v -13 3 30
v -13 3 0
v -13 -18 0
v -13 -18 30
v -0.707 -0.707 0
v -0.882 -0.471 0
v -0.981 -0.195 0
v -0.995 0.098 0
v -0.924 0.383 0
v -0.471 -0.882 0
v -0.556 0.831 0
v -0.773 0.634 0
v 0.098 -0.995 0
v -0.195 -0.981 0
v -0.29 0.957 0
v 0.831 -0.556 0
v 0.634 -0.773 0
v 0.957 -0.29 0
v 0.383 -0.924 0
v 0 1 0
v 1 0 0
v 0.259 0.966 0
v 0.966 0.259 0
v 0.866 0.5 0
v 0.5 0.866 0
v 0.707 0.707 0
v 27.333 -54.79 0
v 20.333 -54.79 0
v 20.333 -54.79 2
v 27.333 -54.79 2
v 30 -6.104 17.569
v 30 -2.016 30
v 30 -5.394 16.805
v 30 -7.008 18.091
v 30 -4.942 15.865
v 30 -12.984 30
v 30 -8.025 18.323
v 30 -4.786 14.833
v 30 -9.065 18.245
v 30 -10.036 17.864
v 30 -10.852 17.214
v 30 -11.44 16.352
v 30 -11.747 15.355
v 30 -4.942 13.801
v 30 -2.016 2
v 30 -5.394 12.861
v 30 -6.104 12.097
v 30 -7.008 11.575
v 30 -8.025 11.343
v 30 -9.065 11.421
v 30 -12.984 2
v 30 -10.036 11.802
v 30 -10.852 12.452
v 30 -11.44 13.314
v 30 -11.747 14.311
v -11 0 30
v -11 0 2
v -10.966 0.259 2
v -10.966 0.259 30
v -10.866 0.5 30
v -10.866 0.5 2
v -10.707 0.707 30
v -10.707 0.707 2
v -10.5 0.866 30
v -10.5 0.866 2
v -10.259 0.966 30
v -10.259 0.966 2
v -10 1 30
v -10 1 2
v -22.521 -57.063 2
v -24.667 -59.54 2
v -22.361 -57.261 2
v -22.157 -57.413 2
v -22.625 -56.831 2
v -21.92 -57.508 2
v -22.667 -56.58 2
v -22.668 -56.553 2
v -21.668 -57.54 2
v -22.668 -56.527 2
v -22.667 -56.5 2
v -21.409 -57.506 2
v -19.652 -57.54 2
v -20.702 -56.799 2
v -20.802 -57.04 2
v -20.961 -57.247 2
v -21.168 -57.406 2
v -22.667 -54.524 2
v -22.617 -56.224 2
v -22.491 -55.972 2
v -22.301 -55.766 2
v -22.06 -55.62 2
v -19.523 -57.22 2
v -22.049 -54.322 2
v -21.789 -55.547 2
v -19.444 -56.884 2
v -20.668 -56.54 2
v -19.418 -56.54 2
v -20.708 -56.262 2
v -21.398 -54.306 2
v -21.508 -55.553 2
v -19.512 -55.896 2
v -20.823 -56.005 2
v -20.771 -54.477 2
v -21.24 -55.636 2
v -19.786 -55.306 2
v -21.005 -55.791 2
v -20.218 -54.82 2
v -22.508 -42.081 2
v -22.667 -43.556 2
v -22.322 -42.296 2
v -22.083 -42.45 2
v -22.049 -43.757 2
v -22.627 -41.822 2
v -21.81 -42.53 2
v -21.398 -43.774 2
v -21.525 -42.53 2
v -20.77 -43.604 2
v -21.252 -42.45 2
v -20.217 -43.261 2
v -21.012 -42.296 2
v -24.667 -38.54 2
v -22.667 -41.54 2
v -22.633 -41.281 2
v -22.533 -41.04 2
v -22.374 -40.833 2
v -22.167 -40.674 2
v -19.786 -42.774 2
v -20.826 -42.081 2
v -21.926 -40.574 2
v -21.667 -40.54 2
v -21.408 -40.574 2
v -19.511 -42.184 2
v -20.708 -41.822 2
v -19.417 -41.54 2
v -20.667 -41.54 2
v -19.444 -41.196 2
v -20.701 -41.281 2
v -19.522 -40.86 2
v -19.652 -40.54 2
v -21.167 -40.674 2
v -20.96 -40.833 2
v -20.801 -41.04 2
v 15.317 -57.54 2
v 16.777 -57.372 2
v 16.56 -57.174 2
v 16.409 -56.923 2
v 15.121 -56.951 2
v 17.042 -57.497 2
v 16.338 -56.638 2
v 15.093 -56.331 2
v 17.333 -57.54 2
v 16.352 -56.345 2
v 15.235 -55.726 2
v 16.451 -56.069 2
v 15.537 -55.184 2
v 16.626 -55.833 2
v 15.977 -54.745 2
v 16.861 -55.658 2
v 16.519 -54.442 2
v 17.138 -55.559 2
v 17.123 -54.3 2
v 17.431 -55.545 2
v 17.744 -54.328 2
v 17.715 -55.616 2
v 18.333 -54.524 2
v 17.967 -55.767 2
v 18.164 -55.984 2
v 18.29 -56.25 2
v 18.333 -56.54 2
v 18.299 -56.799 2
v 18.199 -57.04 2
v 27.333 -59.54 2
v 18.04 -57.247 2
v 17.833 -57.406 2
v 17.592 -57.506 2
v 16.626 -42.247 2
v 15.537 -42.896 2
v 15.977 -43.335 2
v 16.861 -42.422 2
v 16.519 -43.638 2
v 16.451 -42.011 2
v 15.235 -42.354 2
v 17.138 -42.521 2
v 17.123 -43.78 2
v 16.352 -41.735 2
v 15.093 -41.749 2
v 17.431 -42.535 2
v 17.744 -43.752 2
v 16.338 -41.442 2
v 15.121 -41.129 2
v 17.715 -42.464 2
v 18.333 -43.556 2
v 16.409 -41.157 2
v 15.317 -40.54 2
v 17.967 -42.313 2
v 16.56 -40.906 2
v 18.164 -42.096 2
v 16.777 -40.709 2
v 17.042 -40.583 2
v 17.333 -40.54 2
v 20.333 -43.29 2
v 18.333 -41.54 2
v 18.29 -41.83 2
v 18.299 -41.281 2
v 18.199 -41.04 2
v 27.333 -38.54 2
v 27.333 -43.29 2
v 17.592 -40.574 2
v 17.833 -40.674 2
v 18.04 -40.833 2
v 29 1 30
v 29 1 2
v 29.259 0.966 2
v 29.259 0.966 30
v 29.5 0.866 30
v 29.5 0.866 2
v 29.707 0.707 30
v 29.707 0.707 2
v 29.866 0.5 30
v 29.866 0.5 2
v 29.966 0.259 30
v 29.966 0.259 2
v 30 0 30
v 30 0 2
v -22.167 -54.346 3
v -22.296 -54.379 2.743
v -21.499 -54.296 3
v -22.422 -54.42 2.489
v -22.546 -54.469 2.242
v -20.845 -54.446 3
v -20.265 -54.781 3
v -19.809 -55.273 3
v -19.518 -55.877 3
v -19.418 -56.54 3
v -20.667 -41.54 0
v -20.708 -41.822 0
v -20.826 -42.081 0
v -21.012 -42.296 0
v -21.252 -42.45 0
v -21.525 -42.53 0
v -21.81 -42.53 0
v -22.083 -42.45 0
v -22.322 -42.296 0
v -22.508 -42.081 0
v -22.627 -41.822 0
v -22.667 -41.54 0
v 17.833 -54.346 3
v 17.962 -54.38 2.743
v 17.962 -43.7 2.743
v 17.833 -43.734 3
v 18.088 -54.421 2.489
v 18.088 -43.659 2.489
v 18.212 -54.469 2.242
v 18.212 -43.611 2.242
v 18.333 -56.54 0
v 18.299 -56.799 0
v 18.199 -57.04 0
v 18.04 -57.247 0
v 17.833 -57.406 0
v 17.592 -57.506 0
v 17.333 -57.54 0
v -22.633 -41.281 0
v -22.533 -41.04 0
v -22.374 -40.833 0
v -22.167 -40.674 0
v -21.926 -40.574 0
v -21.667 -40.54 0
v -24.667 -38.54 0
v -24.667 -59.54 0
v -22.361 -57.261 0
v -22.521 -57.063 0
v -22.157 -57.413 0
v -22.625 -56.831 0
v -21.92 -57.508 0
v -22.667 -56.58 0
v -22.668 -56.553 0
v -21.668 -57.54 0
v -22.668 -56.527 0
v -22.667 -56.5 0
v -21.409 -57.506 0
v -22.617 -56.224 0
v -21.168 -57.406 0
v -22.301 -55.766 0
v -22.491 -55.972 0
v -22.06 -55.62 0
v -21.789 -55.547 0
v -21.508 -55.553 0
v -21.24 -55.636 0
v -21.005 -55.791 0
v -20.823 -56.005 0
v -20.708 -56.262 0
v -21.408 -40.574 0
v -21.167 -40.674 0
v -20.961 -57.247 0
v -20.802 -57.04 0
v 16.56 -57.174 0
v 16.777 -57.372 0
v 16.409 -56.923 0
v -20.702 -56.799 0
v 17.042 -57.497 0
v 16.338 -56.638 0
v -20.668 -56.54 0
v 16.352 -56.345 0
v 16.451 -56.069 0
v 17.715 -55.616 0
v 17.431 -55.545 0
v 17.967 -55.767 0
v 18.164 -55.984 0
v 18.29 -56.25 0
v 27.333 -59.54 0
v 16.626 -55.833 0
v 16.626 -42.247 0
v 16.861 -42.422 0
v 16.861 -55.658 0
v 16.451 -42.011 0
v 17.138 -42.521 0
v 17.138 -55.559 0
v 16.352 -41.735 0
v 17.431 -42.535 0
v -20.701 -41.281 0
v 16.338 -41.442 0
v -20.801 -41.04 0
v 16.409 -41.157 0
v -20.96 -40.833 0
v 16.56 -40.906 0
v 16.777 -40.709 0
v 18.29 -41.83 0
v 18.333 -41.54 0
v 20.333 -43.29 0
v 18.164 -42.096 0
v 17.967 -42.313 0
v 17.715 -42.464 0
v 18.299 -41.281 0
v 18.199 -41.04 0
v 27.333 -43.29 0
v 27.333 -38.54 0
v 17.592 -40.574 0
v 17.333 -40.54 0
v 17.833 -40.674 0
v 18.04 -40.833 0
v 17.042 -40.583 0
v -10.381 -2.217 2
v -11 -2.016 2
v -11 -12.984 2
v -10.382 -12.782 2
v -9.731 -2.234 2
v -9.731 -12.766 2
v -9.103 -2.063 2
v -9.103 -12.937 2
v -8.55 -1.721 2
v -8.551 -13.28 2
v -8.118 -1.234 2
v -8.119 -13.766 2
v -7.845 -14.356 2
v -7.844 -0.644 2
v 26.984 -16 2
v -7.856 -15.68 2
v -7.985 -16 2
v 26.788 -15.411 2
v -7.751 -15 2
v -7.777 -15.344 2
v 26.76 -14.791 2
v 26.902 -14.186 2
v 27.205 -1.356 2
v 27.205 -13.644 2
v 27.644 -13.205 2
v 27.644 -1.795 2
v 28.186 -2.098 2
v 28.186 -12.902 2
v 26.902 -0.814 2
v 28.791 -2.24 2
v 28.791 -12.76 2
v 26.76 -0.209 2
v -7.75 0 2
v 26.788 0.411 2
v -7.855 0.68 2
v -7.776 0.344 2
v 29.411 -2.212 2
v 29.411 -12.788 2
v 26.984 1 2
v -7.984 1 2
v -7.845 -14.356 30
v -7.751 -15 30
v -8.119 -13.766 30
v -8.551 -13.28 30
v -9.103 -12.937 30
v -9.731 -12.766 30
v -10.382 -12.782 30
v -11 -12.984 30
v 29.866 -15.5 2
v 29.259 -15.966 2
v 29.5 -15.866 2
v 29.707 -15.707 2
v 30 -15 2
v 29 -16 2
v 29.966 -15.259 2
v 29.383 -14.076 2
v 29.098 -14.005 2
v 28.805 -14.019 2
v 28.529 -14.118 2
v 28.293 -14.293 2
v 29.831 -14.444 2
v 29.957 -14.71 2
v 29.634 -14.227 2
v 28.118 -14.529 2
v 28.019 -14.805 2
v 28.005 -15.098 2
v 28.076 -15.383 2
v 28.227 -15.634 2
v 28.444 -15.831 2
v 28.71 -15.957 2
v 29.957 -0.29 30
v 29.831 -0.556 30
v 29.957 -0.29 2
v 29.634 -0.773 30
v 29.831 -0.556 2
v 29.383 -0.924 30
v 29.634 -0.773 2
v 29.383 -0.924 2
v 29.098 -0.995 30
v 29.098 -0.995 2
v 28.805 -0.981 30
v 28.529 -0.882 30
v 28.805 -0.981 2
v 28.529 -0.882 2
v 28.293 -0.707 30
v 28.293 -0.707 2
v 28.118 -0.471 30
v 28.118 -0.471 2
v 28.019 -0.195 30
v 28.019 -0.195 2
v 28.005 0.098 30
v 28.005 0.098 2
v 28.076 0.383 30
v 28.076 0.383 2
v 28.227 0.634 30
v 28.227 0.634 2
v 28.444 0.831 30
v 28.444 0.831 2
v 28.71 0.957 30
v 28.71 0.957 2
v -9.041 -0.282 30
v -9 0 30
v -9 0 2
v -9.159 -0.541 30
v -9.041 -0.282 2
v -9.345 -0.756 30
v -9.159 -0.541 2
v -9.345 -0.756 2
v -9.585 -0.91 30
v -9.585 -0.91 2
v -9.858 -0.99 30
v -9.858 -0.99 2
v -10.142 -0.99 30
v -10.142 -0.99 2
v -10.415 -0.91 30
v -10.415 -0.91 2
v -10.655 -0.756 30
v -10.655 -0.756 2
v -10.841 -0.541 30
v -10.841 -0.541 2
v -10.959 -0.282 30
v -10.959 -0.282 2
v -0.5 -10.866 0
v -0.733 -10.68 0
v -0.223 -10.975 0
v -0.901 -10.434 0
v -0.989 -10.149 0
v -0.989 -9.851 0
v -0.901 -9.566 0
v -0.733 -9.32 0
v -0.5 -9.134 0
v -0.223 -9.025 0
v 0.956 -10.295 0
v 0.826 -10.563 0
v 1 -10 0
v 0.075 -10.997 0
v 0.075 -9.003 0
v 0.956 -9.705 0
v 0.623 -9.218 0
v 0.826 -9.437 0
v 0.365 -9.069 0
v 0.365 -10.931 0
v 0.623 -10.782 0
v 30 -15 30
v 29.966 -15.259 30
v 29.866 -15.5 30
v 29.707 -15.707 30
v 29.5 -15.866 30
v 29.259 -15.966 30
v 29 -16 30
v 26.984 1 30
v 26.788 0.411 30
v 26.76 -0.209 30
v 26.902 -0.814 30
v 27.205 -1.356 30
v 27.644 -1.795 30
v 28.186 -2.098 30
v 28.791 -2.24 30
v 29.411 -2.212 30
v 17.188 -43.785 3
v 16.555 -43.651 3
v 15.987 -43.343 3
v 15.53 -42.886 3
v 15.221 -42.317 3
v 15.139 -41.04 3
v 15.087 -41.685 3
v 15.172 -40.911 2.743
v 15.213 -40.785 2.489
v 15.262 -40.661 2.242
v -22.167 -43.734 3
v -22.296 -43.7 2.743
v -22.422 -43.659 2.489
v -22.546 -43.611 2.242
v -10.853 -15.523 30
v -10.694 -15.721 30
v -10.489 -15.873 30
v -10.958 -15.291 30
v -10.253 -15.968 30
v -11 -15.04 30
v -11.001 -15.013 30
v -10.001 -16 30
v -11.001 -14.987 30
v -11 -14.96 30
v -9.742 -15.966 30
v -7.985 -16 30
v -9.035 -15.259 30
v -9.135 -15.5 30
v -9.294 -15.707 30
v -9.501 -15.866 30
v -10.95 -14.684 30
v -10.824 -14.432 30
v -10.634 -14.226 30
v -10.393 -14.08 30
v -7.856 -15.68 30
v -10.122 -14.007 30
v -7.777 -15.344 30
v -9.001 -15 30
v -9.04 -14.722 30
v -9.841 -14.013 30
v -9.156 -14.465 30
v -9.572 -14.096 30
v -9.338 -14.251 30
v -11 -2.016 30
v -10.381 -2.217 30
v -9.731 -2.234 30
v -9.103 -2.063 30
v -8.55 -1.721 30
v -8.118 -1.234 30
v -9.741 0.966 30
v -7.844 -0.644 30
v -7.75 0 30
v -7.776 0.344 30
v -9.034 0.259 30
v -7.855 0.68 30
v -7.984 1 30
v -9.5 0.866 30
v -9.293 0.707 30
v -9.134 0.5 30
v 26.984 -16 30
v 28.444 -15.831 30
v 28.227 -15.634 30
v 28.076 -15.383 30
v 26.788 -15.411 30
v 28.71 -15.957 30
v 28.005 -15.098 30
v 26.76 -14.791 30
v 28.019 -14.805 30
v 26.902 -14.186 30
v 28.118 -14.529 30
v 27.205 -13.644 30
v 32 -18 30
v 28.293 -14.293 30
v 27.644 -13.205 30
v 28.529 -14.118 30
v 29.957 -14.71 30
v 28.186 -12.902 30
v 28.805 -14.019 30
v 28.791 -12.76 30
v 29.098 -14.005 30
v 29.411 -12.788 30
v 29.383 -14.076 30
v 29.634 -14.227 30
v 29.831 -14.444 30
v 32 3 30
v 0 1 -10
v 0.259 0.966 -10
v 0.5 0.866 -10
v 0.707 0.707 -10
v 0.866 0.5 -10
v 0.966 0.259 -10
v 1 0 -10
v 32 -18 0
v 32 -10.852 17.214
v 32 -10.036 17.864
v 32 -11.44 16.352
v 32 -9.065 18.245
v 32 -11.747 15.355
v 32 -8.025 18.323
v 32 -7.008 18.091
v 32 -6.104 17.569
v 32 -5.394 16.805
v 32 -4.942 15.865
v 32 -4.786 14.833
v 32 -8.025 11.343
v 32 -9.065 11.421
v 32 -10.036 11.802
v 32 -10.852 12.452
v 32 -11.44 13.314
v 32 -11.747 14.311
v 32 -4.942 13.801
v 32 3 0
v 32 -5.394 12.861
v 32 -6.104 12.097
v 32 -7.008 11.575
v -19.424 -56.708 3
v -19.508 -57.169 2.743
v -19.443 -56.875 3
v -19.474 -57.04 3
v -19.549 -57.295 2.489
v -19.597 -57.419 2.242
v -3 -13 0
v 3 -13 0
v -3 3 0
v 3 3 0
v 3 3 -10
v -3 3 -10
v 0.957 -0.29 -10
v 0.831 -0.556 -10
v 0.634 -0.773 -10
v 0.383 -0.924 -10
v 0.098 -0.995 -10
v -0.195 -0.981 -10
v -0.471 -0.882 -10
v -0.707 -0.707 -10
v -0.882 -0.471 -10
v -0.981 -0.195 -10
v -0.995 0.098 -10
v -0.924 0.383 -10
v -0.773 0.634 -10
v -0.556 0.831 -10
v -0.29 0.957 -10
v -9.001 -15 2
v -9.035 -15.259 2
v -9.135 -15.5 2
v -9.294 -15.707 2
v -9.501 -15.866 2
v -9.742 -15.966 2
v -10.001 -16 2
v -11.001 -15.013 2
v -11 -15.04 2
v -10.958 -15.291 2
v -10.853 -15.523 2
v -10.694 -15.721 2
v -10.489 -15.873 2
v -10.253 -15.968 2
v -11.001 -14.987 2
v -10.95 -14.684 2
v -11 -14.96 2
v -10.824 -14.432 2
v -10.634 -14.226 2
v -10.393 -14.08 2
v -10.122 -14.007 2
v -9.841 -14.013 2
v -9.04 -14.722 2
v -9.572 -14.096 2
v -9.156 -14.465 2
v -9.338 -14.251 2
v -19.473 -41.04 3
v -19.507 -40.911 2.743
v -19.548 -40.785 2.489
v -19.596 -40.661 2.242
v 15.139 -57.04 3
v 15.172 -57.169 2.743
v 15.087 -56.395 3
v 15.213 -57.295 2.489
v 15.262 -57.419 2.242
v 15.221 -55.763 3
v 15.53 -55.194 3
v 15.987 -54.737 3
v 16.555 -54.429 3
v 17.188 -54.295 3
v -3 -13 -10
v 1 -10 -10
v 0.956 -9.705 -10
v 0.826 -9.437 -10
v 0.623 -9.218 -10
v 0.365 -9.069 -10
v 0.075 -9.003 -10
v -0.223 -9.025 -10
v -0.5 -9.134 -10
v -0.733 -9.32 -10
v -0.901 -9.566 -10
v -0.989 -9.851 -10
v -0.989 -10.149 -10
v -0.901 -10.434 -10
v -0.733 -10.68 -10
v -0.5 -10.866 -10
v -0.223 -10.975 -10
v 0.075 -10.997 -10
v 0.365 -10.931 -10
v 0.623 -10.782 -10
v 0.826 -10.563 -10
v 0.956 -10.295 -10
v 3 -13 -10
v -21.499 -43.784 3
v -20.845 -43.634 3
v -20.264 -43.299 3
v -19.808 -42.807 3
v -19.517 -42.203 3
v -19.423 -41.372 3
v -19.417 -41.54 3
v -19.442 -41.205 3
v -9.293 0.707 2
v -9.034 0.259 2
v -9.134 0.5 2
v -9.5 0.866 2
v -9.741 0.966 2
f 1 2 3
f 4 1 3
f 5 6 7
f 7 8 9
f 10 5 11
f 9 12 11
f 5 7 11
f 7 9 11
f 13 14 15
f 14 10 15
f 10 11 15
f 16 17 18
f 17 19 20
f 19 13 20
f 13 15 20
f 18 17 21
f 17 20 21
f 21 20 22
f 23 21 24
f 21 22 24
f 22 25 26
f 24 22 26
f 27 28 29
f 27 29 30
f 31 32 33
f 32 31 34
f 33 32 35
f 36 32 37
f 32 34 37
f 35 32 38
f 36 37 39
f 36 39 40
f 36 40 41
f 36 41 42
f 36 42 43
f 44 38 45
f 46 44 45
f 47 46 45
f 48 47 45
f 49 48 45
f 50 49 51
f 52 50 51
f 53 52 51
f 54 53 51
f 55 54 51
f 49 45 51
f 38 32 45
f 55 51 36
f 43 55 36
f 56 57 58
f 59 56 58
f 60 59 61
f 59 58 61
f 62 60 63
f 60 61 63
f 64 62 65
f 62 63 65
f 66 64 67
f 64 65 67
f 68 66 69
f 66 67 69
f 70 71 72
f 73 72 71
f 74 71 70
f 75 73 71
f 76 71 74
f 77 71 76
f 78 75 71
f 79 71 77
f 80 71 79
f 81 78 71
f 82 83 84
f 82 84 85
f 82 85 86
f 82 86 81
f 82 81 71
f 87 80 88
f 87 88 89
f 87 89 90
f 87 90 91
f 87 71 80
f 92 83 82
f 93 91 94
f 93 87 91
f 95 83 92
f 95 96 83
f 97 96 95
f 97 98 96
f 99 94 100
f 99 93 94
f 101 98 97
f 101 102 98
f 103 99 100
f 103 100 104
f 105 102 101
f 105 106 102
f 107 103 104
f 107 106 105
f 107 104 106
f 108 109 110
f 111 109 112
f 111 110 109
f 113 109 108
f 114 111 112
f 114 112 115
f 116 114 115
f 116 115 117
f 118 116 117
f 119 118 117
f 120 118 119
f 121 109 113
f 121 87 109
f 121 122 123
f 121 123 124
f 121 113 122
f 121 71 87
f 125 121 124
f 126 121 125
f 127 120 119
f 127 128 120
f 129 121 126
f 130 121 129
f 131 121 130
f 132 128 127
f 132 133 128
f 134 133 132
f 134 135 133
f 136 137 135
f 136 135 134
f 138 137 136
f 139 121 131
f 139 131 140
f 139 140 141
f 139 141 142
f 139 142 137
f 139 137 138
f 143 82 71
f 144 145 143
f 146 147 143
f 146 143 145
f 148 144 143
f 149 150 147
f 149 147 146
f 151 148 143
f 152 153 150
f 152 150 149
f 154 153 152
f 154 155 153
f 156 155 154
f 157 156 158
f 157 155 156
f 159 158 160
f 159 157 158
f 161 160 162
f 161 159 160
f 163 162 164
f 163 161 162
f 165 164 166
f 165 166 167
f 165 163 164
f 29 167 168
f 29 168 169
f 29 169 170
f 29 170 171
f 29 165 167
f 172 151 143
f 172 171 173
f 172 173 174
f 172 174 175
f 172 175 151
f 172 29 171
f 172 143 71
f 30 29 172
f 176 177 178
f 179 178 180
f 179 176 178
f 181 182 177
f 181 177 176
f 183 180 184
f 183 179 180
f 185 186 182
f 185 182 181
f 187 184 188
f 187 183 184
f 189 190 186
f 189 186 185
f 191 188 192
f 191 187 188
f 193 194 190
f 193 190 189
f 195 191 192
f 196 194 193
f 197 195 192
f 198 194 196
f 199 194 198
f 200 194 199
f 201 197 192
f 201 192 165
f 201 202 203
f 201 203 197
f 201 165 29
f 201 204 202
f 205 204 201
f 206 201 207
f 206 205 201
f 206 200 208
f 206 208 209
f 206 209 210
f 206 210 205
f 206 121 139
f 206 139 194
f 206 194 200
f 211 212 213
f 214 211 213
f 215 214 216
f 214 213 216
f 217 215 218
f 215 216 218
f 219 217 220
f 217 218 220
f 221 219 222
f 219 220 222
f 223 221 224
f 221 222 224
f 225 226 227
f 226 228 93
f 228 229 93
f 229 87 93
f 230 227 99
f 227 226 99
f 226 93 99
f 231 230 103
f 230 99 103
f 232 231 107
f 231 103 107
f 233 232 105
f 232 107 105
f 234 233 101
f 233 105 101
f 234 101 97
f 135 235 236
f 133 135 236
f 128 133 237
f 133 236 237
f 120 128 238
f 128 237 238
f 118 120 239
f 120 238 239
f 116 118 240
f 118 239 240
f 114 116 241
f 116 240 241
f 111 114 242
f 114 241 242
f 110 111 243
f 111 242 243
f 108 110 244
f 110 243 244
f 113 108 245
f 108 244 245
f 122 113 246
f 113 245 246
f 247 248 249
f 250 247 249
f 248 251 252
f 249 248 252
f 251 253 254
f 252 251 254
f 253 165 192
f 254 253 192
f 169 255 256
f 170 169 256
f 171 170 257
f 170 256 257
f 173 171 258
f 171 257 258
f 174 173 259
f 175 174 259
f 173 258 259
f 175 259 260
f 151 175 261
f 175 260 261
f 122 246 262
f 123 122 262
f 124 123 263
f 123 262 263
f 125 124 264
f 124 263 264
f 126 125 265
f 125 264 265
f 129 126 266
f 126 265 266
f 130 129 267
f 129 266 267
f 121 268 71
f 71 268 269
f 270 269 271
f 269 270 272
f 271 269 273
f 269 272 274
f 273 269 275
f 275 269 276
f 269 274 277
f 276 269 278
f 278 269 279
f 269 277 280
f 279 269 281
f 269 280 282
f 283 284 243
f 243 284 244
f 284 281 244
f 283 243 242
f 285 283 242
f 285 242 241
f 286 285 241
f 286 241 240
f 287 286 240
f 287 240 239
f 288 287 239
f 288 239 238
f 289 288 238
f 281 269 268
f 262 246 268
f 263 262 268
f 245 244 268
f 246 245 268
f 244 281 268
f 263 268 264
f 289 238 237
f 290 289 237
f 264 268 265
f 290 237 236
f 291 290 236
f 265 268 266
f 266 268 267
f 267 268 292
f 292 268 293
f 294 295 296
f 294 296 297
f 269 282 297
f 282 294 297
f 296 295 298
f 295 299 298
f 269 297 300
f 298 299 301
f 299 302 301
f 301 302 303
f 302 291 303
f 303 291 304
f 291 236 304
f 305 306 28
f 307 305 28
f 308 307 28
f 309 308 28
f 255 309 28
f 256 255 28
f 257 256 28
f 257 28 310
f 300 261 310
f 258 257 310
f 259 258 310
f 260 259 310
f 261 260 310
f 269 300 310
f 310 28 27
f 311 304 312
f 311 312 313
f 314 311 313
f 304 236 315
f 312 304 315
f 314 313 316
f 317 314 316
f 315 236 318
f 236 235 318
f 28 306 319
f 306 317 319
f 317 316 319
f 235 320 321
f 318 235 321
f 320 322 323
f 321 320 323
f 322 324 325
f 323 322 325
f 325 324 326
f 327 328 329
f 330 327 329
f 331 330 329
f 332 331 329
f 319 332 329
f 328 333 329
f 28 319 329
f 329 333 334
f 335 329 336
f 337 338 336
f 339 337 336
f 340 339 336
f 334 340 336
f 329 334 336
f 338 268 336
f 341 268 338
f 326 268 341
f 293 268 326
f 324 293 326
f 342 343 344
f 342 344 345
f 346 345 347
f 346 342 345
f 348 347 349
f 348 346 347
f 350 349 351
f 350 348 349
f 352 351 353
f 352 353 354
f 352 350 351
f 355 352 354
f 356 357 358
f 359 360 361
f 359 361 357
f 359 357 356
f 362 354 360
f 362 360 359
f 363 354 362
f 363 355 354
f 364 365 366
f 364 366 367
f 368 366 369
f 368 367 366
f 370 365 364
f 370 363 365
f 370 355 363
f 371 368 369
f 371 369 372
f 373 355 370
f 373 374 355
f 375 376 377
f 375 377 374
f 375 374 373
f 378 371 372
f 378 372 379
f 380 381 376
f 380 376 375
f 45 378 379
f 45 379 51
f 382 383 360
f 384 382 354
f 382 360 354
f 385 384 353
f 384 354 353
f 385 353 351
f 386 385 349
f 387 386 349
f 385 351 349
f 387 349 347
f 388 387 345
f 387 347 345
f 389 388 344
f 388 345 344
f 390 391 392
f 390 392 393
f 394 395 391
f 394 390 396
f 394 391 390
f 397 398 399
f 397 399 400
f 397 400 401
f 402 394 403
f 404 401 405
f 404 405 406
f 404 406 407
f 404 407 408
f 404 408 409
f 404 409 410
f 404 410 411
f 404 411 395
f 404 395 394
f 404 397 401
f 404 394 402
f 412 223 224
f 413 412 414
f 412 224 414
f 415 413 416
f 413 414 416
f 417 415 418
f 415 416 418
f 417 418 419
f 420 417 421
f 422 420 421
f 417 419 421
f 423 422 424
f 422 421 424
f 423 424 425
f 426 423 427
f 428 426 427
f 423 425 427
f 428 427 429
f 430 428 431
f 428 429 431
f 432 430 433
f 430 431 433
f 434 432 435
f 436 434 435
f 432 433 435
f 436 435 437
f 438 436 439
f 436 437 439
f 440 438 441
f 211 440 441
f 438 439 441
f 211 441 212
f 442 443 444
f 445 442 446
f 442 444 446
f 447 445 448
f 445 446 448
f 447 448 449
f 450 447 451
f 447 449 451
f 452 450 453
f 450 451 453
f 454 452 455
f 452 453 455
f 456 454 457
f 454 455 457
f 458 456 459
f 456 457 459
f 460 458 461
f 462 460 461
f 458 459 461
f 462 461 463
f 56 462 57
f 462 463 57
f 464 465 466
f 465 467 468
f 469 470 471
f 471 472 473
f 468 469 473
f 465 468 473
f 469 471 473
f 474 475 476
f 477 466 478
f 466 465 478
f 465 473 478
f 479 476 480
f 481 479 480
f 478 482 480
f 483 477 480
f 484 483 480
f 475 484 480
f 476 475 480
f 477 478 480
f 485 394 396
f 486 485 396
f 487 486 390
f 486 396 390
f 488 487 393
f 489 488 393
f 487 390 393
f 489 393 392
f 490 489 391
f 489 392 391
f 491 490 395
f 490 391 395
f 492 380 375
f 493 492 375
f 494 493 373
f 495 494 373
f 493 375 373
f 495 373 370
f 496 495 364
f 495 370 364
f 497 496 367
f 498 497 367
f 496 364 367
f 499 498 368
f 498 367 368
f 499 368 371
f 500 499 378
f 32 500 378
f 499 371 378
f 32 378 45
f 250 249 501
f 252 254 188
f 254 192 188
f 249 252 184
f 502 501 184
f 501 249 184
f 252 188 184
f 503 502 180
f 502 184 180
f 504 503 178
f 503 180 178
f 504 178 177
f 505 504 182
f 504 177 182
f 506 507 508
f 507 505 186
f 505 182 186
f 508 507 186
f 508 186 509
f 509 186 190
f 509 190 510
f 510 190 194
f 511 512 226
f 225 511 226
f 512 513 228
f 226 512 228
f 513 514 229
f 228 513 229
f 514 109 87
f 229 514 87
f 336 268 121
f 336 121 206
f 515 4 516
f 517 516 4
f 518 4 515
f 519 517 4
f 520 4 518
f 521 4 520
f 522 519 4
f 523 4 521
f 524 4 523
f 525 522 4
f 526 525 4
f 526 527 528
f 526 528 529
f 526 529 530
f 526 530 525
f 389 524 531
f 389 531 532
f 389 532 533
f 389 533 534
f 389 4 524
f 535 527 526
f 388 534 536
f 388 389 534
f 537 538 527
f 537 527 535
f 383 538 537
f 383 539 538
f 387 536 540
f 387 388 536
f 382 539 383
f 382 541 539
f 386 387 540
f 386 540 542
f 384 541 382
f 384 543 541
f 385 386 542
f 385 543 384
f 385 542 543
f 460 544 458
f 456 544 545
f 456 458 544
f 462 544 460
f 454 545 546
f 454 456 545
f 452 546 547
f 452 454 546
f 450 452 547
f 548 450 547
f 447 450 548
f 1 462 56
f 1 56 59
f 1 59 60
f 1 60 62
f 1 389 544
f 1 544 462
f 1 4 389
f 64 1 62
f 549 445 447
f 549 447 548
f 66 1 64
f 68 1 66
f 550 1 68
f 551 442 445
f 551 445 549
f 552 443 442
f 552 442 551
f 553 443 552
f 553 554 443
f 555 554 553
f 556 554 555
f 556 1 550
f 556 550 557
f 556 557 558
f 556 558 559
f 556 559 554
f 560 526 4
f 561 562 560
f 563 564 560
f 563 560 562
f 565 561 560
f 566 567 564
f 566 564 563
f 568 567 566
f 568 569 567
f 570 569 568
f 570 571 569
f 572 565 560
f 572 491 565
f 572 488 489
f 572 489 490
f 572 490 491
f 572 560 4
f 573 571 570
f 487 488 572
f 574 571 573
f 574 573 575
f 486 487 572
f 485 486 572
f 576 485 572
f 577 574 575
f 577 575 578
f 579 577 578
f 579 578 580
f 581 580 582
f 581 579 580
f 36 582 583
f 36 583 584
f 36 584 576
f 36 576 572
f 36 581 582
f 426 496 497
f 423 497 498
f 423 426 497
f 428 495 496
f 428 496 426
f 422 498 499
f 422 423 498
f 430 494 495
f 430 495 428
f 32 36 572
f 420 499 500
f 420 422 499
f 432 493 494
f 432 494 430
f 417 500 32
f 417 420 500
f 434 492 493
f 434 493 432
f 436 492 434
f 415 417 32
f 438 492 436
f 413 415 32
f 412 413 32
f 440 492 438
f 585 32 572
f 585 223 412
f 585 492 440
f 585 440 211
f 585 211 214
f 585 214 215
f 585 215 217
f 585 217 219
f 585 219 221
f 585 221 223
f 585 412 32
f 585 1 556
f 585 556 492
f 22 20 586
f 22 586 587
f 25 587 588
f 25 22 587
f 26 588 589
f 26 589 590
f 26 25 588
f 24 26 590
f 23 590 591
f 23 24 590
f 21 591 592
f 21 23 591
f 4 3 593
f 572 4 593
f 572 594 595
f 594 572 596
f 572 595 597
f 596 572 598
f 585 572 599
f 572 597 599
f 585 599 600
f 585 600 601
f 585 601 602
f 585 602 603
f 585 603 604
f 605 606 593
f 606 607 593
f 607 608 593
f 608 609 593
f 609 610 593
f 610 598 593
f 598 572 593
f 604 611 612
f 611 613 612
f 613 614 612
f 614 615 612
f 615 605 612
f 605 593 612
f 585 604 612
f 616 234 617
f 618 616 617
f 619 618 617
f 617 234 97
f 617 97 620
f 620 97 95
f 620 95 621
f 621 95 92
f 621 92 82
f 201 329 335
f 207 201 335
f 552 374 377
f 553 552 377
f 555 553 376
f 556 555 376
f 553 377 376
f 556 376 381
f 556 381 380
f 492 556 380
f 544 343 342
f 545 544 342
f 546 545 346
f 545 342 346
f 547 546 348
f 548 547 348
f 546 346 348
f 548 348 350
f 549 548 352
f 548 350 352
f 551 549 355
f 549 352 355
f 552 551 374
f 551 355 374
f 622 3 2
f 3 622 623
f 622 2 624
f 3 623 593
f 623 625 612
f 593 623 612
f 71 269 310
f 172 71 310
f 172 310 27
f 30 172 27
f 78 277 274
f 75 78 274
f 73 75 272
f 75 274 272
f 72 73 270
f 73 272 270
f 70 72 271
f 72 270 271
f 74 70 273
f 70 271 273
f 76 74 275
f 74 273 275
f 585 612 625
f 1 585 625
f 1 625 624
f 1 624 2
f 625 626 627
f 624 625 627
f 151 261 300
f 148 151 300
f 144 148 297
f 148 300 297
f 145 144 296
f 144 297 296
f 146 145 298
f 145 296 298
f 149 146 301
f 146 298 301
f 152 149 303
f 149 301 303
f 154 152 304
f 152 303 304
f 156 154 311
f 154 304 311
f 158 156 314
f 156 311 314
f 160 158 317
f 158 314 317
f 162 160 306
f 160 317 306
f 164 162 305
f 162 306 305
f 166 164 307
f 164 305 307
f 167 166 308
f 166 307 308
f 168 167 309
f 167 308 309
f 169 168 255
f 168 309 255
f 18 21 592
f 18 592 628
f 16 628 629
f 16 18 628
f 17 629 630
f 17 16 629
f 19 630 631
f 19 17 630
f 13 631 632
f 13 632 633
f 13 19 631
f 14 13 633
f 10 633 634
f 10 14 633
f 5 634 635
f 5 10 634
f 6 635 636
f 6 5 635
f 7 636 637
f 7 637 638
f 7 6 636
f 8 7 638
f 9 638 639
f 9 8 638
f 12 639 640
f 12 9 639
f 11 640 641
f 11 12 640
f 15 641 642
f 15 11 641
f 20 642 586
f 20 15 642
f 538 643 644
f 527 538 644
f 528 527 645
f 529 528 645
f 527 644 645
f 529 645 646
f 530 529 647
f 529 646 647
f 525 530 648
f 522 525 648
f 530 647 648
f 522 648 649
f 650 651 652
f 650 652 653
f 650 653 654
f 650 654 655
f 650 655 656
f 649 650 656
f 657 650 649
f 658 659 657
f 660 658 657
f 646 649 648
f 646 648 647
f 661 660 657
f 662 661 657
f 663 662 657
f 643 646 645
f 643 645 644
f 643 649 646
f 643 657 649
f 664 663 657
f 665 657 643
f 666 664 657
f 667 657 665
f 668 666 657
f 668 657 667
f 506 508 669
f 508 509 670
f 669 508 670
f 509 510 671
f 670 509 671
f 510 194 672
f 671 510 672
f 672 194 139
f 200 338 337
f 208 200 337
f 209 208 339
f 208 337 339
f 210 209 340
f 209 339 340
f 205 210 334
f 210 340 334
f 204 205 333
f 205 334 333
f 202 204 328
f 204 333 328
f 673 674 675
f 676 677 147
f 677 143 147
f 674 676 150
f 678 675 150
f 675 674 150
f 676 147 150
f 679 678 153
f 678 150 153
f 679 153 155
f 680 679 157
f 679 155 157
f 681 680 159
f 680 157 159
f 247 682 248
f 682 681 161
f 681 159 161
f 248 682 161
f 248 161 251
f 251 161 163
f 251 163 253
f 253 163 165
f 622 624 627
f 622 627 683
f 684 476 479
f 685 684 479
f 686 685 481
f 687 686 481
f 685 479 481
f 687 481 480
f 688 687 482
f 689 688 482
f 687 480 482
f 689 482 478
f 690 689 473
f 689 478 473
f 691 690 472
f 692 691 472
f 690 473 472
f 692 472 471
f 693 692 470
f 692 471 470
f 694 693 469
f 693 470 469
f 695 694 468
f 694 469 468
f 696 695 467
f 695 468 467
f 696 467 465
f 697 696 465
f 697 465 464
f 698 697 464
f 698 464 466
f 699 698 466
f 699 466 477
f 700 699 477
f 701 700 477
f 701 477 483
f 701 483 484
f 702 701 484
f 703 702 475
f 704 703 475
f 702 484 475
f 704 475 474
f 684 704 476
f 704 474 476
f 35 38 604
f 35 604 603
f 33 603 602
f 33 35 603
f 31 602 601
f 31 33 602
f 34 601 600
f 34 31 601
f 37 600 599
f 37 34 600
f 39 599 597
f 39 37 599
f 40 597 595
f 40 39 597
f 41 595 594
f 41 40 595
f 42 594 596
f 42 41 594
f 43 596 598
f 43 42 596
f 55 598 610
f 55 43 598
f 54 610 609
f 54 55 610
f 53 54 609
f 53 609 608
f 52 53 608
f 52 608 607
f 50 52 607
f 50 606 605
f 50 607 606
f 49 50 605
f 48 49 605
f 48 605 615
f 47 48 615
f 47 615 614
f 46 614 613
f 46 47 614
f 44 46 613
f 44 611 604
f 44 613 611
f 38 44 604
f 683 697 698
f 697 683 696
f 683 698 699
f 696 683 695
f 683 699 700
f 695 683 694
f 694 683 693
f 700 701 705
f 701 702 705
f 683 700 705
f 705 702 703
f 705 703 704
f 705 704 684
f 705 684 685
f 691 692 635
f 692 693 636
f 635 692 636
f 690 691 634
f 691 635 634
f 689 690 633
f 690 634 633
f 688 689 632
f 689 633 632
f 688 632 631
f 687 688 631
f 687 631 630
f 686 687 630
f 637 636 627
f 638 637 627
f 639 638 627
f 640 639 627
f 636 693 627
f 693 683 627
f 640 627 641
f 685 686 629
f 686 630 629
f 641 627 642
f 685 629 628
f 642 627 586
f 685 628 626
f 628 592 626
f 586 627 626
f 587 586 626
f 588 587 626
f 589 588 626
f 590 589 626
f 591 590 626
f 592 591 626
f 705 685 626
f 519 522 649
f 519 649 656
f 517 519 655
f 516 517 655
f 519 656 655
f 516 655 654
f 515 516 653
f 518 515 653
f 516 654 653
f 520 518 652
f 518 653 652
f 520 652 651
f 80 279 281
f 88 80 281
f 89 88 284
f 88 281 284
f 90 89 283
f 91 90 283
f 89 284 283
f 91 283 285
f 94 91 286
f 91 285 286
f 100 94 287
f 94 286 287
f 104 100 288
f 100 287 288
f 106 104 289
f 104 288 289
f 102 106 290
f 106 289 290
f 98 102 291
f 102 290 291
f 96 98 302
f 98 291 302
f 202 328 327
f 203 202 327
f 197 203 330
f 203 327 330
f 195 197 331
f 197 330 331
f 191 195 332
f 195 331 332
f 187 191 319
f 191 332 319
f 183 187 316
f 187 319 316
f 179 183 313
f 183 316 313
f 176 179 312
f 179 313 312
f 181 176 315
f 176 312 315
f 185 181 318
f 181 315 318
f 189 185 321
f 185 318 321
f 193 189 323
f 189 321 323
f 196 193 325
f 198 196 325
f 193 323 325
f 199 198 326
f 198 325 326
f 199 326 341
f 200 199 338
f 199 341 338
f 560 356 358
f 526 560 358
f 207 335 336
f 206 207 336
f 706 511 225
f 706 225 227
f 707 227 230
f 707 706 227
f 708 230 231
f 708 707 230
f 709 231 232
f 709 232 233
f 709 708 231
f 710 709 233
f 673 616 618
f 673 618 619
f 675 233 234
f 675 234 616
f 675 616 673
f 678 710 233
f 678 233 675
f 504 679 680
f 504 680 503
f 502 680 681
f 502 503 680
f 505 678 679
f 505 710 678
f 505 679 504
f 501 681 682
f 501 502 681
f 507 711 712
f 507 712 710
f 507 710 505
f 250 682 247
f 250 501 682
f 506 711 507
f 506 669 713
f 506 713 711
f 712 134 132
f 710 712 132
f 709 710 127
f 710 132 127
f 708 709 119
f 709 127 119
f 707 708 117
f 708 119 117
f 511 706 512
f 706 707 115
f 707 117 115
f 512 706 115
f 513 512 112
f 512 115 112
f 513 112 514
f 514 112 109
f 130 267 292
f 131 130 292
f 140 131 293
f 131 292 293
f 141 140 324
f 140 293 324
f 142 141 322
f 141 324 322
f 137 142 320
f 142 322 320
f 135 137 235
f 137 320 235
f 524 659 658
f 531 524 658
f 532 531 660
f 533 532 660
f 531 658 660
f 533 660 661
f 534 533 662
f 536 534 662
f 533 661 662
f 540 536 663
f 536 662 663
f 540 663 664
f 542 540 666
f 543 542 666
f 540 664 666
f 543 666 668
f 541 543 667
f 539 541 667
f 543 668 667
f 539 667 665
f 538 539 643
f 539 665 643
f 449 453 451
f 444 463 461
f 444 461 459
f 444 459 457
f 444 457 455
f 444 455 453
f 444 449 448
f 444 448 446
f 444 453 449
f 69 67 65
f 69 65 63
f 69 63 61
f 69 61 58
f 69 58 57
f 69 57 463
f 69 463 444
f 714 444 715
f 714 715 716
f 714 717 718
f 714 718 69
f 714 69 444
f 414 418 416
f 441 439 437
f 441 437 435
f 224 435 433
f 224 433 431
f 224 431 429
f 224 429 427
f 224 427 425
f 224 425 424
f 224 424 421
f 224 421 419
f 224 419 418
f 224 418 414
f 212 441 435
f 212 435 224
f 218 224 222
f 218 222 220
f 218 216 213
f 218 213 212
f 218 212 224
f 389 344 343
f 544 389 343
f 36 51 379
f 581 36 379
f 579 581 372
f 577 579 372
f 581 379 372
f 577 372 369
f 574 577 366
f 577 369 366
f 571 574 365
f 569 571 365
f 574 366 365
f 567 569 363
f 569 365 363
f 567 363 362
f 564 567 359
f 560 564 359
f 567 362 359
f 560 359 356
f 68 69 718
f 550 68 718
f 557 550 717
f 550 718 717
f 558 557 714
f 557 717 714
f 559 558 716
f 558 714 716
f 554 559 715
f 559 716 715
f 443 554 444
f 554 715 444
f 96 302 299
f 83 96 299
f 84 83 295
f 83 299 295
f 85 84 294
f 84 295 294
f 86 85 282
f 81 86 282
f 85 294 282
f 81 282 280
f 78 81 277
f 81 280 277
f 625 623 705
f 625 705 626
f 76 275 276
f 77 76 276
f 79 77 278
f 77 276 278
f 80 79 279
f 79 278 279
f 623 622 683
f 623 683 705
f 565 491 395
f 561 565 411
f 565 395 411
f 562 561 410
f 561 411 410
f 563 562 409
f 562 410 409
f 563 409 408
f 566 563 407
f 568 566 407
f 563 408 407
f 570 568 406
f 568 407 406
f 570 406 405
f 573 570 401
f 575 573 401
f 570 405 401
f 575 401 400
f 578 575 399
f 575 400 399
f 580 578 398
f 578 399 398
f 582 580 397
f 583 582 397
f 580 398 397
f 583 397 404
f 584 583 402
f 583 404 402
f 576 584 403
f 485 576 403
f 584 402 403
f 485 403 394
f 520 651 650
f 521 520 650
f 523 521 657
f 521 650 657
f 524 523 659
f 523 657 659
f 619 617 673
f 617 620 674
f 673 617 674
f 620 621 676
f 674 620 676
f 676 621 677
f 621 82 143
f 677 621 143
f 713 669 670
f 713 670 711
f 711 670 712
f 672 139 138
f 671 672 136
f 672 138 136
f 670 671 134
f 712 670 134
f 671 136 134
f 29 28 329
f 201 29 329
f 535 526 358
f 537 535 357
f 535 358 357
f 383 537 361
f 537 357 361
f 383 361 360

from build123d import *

# Parameters (mm, degrees)
F1_DEPTH = 30
F0_R     = 1
F2_DEPTH = 2
F3_DEPTH = 10
F4_DEPTH = 2
F5_DEPTH = 3
F6_SIZE2 = 0.99999
F6_SIZE  = 0.49999
F7_R     = 3.5
F8_DEPTH = 40
F0_W     = 7
F0_H     = 4.75
F9_DEPTH = 2


# Not quite as in the source:
# - a fillet or chamfer is up to 0.001 mm smaller than in the source, because OpenCascade refuses the exact size


with BuildPart() as f1:
    # F0 (on Top) → F1 (new body)
    with BuildSketch(Plane.XY):
        Polygon((-3, 1), (-1.2e-09, 1), (3, 1), (3, 3), (-3, 3), align=None)
        with BuildLine():
            Line((-7.9844355629, 1), (-3, 1))
            Line((-3, 1), (-3, 3))
            Line((-3, 3), (-13, 3))
            Line((-13, 3), (-13, -18))
            Line((-13, -18), (32, -18))
            Line((32, -18), (32, 3))
            Line((32, 3), (3, 3))
            Line((3, 3), (3, 1))
            Line((3, 1), (26.9844355629, 1))
            ThreePointArc((26.9844355629, 1), (29.5135562367, 2.1906072199), (31.25, 0))
            ThreePointArc((31.25, 0), (30.9121323176, -1.1858541226), (30, -2.0155644371))
            Line((30, -2.0155644371), (30, -12.9844355629))
            ThreePointArc((30, -12.9844355629), (30.9121323176, -13.8141458774), (31.25, -15))
            ThreePointArc((31.25, -15), (29.5135562367, -17.1906072199), (26.9844355629, -16))
            Line((26.9844355629, -16), (-7.9852204443, -16))
            ThreePointArc((-7.9852204443, -16), (-11.592084853, -16.5906804835), (-11, -12.9840463431))
            Line((-11, -12.9840463431), (-11, -2.0155644371))
            ThreePointArc((-11, -2.0155644371), (-11.5909902577, 1.5909902577), (-7.9844355629, 1))
        make_face()
        with BuildLine():
            ThreePointArc((-7.75, 0), (-7.8093927801, 0.5135562367), (-7.9844355629, 1))
            Line((-7.9844355629, 1), (-10, 1))
            ThreePointArc((-10, 1), (-9.2928932188, 0.7071067812), (-9, 0))
            ThreePointArc((-9, 0), (-10, -1), (-11, 0))
            Line((-11, 0), (-11, -2.0155644371))
            ThreePointArc((-11, -2.0155644371), (-8.8141458774, -1.9121323176), (-7.75, 0))
        make_face()
        with BuildLine():
            Line((-10, 1), (-7.9844355629, 1))
            ThreePointArc((-7.9844355629, 1), (-11.5909902577, 1.5909902577), (-11, -2.0155644371))
            Line((-11, -2.0155644371), (-11, 0))
            Line((-11, 0), (-11, 1))
            Line((-11, 1), (-10, 1))
        make_face()
        with BuildLine():
            ThreePointArc((31.25, 0), (29.5135562367, 2.1906072199), (26.9844355629, 1))
            Line((26.9844355629, 1), (29, 1))
            Line((29, 1), (30, 1))
            Line((30, 1), (30, 0))
            Line((30, 0), (30, -2.0155644371))
            ThreePointArc((30, -2.0155644371), (30.9121323176, -1.1858541226), (31.25, 0))
        make_face()
        with BuildLine():
            Line((29, 1), (26.9844355629, 1))
            ThreePointArc((26.9844355629, 1), (27.4090097423, -1.5909902577), (30, -2.0155644371))
            Line((30, -2.0155644371), (30, 0))
            ThreePointArc((30, 0), (28.2928932188, -0.7071067812), (29, 1))
        make_face()
        with BuildLine():
            Line((30, 1), (29, 1))
            ThreePointArc((29, 1), (29.7071067812, 0.7071067812), (30, 0))
            Line((30, 0), (30, 1))
        make_face()
        with BuildLine():
            ThreePointArc((-11, 0), (-10.7071067812, 0.7071067812), (-10, 1))
            Line((-10, 1), (-11, 1))
            Line((-11, 1), (-11, 0))
        make_face()
        with BuildLine():
            ThreePointArc((-10.0007848814, -16), (-10.6937450327, -15.7209758864), (-11, -15.0396124575))
            Line((-11, -15.0396124575), (-11, -16))
            Line((-11, -16), (-10.0007848814, -16))
        make_face()
        with BuildLine():
            Line((-11, -14.9603875425), (-11, -12.9840463431))
            ThreePointArc((-11, -12.9840463431), (-11.592084853, -16.5906804835), (-7.9852204443, -16))
            Line((-7.9852204443, -16), (-10.0007848814, -16))
            Line((-10.0007848814, -16), (-11, -16))
            Line((-11, -16), (-11, -15.0396124575))
            ThreePointArc((-11, -15.0396124575), (-11.0007848814, -15), (-11, -14.9603875425))
        make_face()
        with BuildLine():
            ThreePointArc((-7.7507848814, -15), (-8.8145585153, -13.0880985882), (-11, -12.9840463431))
            Line((-11, -12.9840463431), (-11, -14.9603875425))
            ThreePointArc((-11, -14.9603875425), (-9.9809747651, -14.0001962396), (-9.0007848814, -15))
            ThreePointArc((-9.0007848814, -15), (-9.2936781002, -15.7071067812), (-10.0007848814, -16))
            Line((-10.0007848814, -16), (-7.9852204443, -16))
            ThreePointArc((-7.9852204443, -16), (-7.8101776616, -15.5135562367), (-7.7507848814, -15))
        make_face()
        with BuildLine():
            Line((30, -16), (30, -15))
            ThreePointArc((30, -15), (29.7071067812, -15.7071067812), (29, -16))
            Line((29, -16), (30, -16))
        make_face()
        with BuildLine():
            Line((30, -15), (30, -12.9844355629))
            ThreePointArc((30, -12.9844355629), (27.4090097423, -13.4090097423), (26.9844355629, -16))
            Line((26.9844355629, -16), (29, -16))
            ThreePointArc((29, -16), (28.2928932188, -14.2928932188), (30, -15))
        make_face()
        with BuildLine():
            ThreePointArc((31.25, -15), (30.9121323176, -13.8141458774), (30, -12.9844355629))
            Line((30, -12.9844355629), (30, -15))
            Line((30, -15), (30, -16))
            Line((30, -16), (29, -16))
            Line((29, -16), (26.9844355629, -16))
            ThreePointArc((26.9844355629, -16), (29.5135562367, -17.1906072199), (31.25, -15))
        make_face()
    extrude(amount=F1_DEPTH)

    # F0 (on Top) → F2 (join)
    with BuildSketch(Plane.XY):
        with BuildLine():
            Line((-3, -13), (-3, 1))
            Line((-3, 1), (-7.9844355629, 1))
            ThreePointArc((-7.9844355629, 1), (-7.8093927801, 0.5135562367), (-7.75, 0))
            ThreePointArc((-7.75, 0), (-8.8141458774, -1.9121323176), (-11, -2.0155644371))
            Line((-11, -2.0155644371), (-11, -12.9840463431))
            ThreePointArc((-11, -12.9840463431), (-8.8145585153, -13.0880985882), (-7.7507848814, -15))
            ThreePointArc((-7.7507848814, -15), (-7.8101776616, -15.5135562367), (-7.9852204443, -16))
            Line((-7.9852204443, -16), (26.9844355629, -16))
            ThreePointArc((26.9844355629, -16), (27.4090097423, -13.4090097423), (30, -12.9844355629))
            Line((30, -12.9844355629), (30, -2.0155644371))
            ThreePointArc((30, -2.0155644371), (27.4090097423, -1.5909902577), (26.9844355629, 1))
            Line((26.9844355629, 1), (3, 1))
            Line((3, 1), (3, -13))
            Line((3, -13), (-3, -13))
        make_face()
        Polygon((3, 1), (-1.2e-09, 1), (-3, 1), (-3, -13), (3, -13), align=None)
        with Locations((0, -10)):
            Circle(F0_R, mode=Mode.SUBTRACT)
        with BuildLine():
            ThreePointArc((-1.2e-09, 1), (0.7071067808, 0.7071067816), (1, 0))
            ThreePointArc((1, 0), (-0.7071067808, -0.7071067816), (-1.2e-09, 1))
        make_face(mode=Mode.SUBTRACT)
        with BuildLine():
            ThreePointArc((-1.2e-09, 1), (-0.7071067808, -0.7071067816), (1, 0))
            ThreePointArc((1, 0), (0.7071067808, 0.7071067816), (-1.2e-09, 1))
        make_face()
        with BuildLine():
            ThreePointArc((-9, 0), (-9.2928932188, 0.7071067812), (-10, 1))
            ThreePointArc((-10, 1), (-10.7071067812, 0.7071067812), (-11, 0))
            ThreePointArc((-11, 0), (-10, -1), (-9, 0))
        make_face()
        with BuildLine():
            ThreePointArc((30, 0), (29.7071067812, 0.7071067812), (29, 1))
            ThreePointArc((29, 1), (28.2928932188, -0.7071067812), (30, 0))
        make_face()
        with BuildLine():
            ThreePointArc((29, -16), (29.7071067812, -15.7071067812), (30, -15))
            ThreePointArc((30, -15), (28.2928932188, -14.2928932188), (29, -16))
        make_face()
        with Locations((0, -10)):
            Circle(F0_R)
        with BuildLine():
            ThreePointArc((-9.0007848814, -15), (-9.9809747651, -14.0001962396), (-11, -14.9603875425))
            Line((-11, -14.9603875425), (-11, -15.0396124575))
            ThreePointArc((-11, -15.0396124575), (-10.6937450327, -15.7209758864), (-10.0007848814, -16))
            ThreePointArc((-10.0007848814, -16), (-9.2936781002, -15.7071067812), (-9.0007848814, -15))
        make_face()
        with BuildLine():
            Line((-11, -15.0396124575), (-11, -14.9603875425))
            ThreePointArc((-11, -14.9603875425), (-11.0007848814, -15), (-11, -15.0396124575))
        make_face()
    extrude(amount=F2_DEPTH)

    # F0 (on Top) → F3 (join)
    with BuildSketch(Plane.XY):
        Polygon((3, 1), (-1.2e-09, 1), (-3, 1), (-3, -13), (3, -13), align=None)
        with Locations((0, -10)):
            Circle(F0_R, mode=Mode.SUBTRACT)
        with BuildLine():
            ThreePointArc((-1.2e-09, 1), (0.7071067808, 0.7071067816), (1, 0))
            ThreePointArc((1, 0), (-0.7071067808, -0.7071067816), (-1.2e-09, 1))
        make_face(mode=Mode.SUBTRACT)
        Polygon((-3, 1), (-1.2e-09, 1), (3, 1), (3, 3), (-3, 3), align=None)
    extrude(amount=-F3_DEPTH)

    # F7 (on Right) → F8 (cut)
    with BuildSketch(Plane.YZ):
        with Locations((-8.2862954587, 14.8329315707)):
            Circle(F7_R)
    extrude(amount=F8_DEPTH, mode=Mode.SUBTRACT)


with BuildPart() as f4:
    # F0 (on Top) → F4 (new body)
    with BuildSketch(Plane.XY):
        with BuildLine():
            Line((-19.6516566587, -40.5400313383), (-14.6672210958, -40.5400313383))
            Line((-14.6672210958, -40.5400313383), (-14.6672210958, -38.5400313383))
            Line((-14.6672210958, -38.5400313383), (-24.6672210958, -38.5400313383))
            Line((-24.6672210958, -38.5400313383), (-24.6672210958, -59.5400313383))
            Line((-24.6672210958, -59.5400313383), (20.3327789042, -59.5400313383))
            Line((20.3327789042, -59.5400313383), (20.3327789042, -54.7900313383))
            Line((20.3327789042, -54.7900313383), (20.3327789042, -43.2900313383))
            Line((20.3327789042, -43.2900313383), (20.3327789042, -38.5400313383))
            Line((20.3327789042, -38.5400313383), (-8.6672210958, -38.5400313383))
            Line((-8.6672210958, -38.5400313383), (-8.6672210958, -40.5400313383))
            Line((-8.6672210958, -40.5400313383), (15.3172144672, -40.5400313383))
            ThreePointArc((15.3172144672, -40.5400313383), (17.846335141, -39.3494241184), (19.5827789042, -41.5400313383))
            ThreePointArc((19.5827789042, -41.5400313383), (19.2449112218, -42.7258854608), (18.3327789042, -43.5555957754))
            Line((18.3327789042, -43.5555957754), (18.3327789042, -54.5244669012))
            ThreePointArc((18.3327789042, -54.5244669012), (19.2449112218, -55.3541772157), (19.5827789042, -56.5400313383))
            ThreePointArc((19.5827789042, -56.5400313383), (17.846335141, -58.7306385581), (15.3172144672, -57.5400313383))
            Line((15.3172144672, -57.5400313383), (-19.6524415401, -57.5400313383))
            ThreePointArc((-19.6524415401, -57.5400313383), (-23.2593059487, -58.1307118218), (-22.6672210958, -54.5240776814))
            Line((-22.6672210958, -54.5240776814), (-22.6672210958, -43.5555957754))
            ThreePointArc((-22.6672210958, -43.5555957754), (-23.2582113534, -39.9490410806), (-19.6516566587, -40.5400313383))
        make_face()
        Polygon((-14.6672210958, -40.5400313383), (-11.6672210958, -40.5400313383), (-8.6672210958, -40.5400313383), (-8.6672210958, -38.5400313383), (-14.6672210958, -38.5400313383), align=None)
        with BuildLine():
            ThreePointArc((-19.4172210958, -41.5400313383), (-19.4766138759, -41.0264751015), (-19.6516566587, -40.5400313383))
            Line((-19.6516566587, -40.5400313383), (-21.6672210958, -40.5400313383))
            ThreePointArc((-21.6672210958, -40.5400313383), (-20.9601143146, -40.8329245571), (-20.6672210958, -41.5400313383))
            ThreePointArc((-20.6672210958, -41.5400313383), (-21.6672210958, -42.5400313383), (-22.6672210958, -41.5400313383))
            Line((-22.6672210958, -41.5400313383), (-22.6672210958, -43.5555957754))
            ThreePointArc((-22.6672210958, -43.5555957754), (-20.4813669732, -43.4521636559), (-19.4172210958, -41.5400313383))
        make_face()
        with BuildLine():
            ThreePointArc((-19.4180059772, -56.5400313383), (-20.4817796111, -54.6281299265), (-22.6672210958, -54.5240776814))
            Line((-22.6672210958, -54.5240776814), (-22.6672210958, -56.5004188808))
            ThreePointArc((-22.6672210958, -56.5004188808), (-21.6481958609, -55.5402275779), (-20.6680059772, -56.5400313383))
            ThreePointArc((-20.6680059772, -56.5400313383), (-20.960899196, -57.2471381195), (-21.6680059772, -57.5400313383))
            Line((-21.6680059772, -57.5400313383), (-19.6524415401, -57.5400313383))
            ThreePointArc((-19.6524415401, -57.5400313383), (-19.4773987573, -57.053587575), (-19.4180059772, -56.5400313383))
        make_face()
        with BuildLine():
            ThreePointArc((19.5827789042, -41.5400313383), (17.846335141, -39.3494241184), (15.3172144672, -40.5400313383))
            Line((15.3172144672, -40.5400313383), (17.332778938, -40.5400313383))
            Line((17.332778938, -40.5400313383), (18.3327789042, -40.5400313383))
            Line((18.3327789042, -40.5400313383), (18.3327789042, -41.5400313383))
            Line((18.3327789042, -41.5400313383), (18.3327789042, -43.5555957754))
            ThreePointArc((18.3327789042, -43.5555957754), (19.2449112218, -42.7258854608), (19.5827789042, -41.5400313383))
        make_face()
        with BuildLine():
            Line((17.332778938, -40.5400313383), (15.3172144672, -40.5400313383))
            ThreePointArc((15.3172144672, -40.5400313383), (15.7417886466, -43.1310215959), (18.3327789042, -43.5555957754))
            Line((18.3327789042, -43.5555957754), (18.3327789042, -41.5400313383))
            ThreePointArc((18.3327789042, -41.5400313383), (16.6256721111, -42.2471381075), (17.332778938, -40.5400313383))
        make_face()
        with BuildLine():
            Line((18.3327789042, -56.5400313383), (18.3327789042, -54.5244669012))
            ThreePointArc((18.3327789042, -54.5244669012), (15.7417886466, -54.9490410806), (15.3172144672, -57.5400313383))
            Line((15.3172144672, -57.5400313383), (17.3327789042, -57.5400313383))
            ThreePointArc((17.3327789042, -57.5400313383), (16.6256721231, -55.8329245571), (18.3327789042, -56.5400313383))
        make_face()
        with BuildLine():
            Line((18.3327789042, -57.5400313383), (18.3327789042, -56.5400313383))
            ThreePointArc((18.3327789042, -56.5400313383), (18.0398856854, -57.2471381195), (17.3327789042, -57.5400313383))
            Line((17.3327789042, -57.5400313383), (18.3327789042, -57.5400313383))
        make_face()
        with BuildLine():
            ThreePointArc((19.5827789042, -56.5400313383), (19.2449112218, -55.3541772157), (18.3327789042, -54.5244669012))
            Line((18.3327789042, -54.5244669012), (18.3327789042, -56.5400313383))
            Line((18.3327789042, -56.5400313383), (18.3327789042, -57.5400313383))
            Line((18.3327789042, -57.5400313383), (17.3327789042, -57.5400313383))
            Line((17.3327789042, -57.5400313383), (15.3172144672, -57.5400313383))
            ThreePointArc((15.3172144672, -57.5400313383), (17.846335141, -58.7306385581), (19.5827789042, -56.5400313383))
        make_face()
        with BuildLine():
            Line((-22.6672210958, -56.5004188808), (-22.6672210958, -54.5240776814))
            ThreePointArc((-22.6672210958, -54.5240776814), (-23.2593059487, -58.1307118218), (-19.6524415401, -57.5400313383))
            Line((-19.6524415401, -57.5400313383), (-21.6680059772, -57.5400313383))
            Line((-21.6680059772, -57.5400313383), (-22.6672210958, -57.5400313383))
            Line((-22.6672210958, -57.5400313383), (-22.6672210958, -56.5796437958))
            ThreePointArc((-22.6672210958, -56.5796437958), (-22.6680059772, -56.5400313383), (-22.6672210958, -56.5004188808))
        make_face()
        with BuildLine():
            Line((-21.6672210958, -40.5400313383), (-19.6516566587, -40.5400313383))
            ThreePointArc((-19.6516566587, -40.5400313383), (-23.2582113534, -39.9490410806), (-22.6672210958, -43.5555957754))
            Line((-22.6672210958, -43.5555957754), (-22.6672210958, -41.5400313383))
            Line((-22.6672210958, -41.5400313383), (-22.6672210958, -40.5400313383))
            Line((-22.6672210958, -40.5400313383), (-21.6672210958, -40.5400313383))
        make_face()
        with BuildLine():
            ThreePointArc((-22.6672210958, -41.5400313383), (-22.3743278769, -40.8329245571), (-21.6672210958, -40.5400313383))
            Line((-21.6672210958, -40.5400313383), (-22.6672210958, -40.5400313383))
            Line((-22.6672210958, -40.5400313383), (-22.6672210958, -41.5400313383))
        make_face()
        with BuildLine():
            ThreePointArc((-21.6680059772, -57.5400313383), (-22.3609661284, -57.2610072247), (-22.6672210958, -56.5796437958))
            Line((-22.6672210958, -56.5796437958), (-22.6672210958, -57.5400313383))
            Line((-22.6672210958, -57.5400313383), (-21.6680059772, -57.5400313383))
        make_face()
        with BuildLine():
            Line((18.3327789042, -40.5400313383), (17.332778938, -40.5400313383))
            ThreePointArc((17.332778938, -40.5400313383), (18.0398856974, -40.832924569), (18.3327789042, -41.5400313383))
            Line((18.3327789042, -41.5400313383), (18.3327789042, -40.5400313383))
        make_face()
    extrude(amount=F4_DEPTH)

    # F0 (on Top) → F5 (join)
    with BuildSketch(Plane.XY):
        with BuildLine():
            Line((-14.6672210958, -54.5400313383), (-14.6672210958, -40.5400313383))
            Line((-14.6672210958, -40.5400313383), (-19.6516566587, -40.5400313383))
            ThreePointArc((-19.6516566587, -40.5400313383), (-19.4766138759, -41.0264751015), (-19.4172210958, -41.5400313383))
            ThreePointArc((-19.4172210958, -41.5400313383), (-20.4813669732, -43.4521636559), (-22.6672210958, -43.5555957754))
            Line((-22.6672210958, -43.5555957754), (-22.6672210958, -54.5240776814))
            ThreePointArc((-22.6672210958, -54.5240776814), (-20.4817796111, -54.6281299265), (-19.4180059772, -56.5400313383))
            ThreePointArc((-19.4180059772, -56.5400313383), (-19.4773987573, -57.053587575), (-19.6524415401, -57.5400313383))
            Line((-19.6524415401, -57.5400313383), (15.3172144672, -57.5400313383))
            ThreePointArc((15.3172144672, -57.5400313383), (15.7417886466, -54.9490410806), (18.3327789042, -54.5244669012))
            Line((18.3327789042, -54.5244669012), (18.3327789042, -43.5555957754))
            ThreePointArc((18.3327789042, -43.5555957754), (15.7417886466, -43.1310215959), (15.3172144672, -40.5400313383))
            Line((15.3172144672, -40.5400313383), (-8.6672210958, -40.5400313383))
            Line((-8.6672210958, -40.5400313383), (-8.6672210958, -54.5400313383))
            Line((-8.6672210958, -54.5400313383), (-14.6672210958, -54.5400313383))
        make_face()
        Polygon((-8.6672210958, -40.5400313383), (-11.6672210958, -40.5400313383), (-14.6672210958, -40.5400313383), (-14.6672210958, -54.5400313383), (-8.6672210958, -54.5400313383), align=None)
        with Locations((-11.6672210958, -51.5400313383)):
            Circle(F0_R, mode=Mode.SUBTRACT)
        with BuildLine():
            ThreePointArc((-11.6672210958, -40.5400313383), (-10.9601143146, -40.8329245571), (-10.6672210958, -41.5400313383))
            ThreePointArc((-10.6672210958, -41.5400313383), (-12.3743278769, -42.2471381195), (-11.6672210958, -40.5400313383))
        make_face(mode=Mode.SUBTRACT)
        with BuildLine():
            ThreePointArc((-11.6672210958, -40.5400313383), (-12.3743278769, -42.2471381195), (-10.6672210958, -41.5400313383))
            ThreePointArc((-10.6672210958, -41.5400313383), (-10.9601143146, -40.8329245571), (-11.6672210958, -40.5400313383))
        make_face()
        with Locations((-11.6672210958, -51.5400313383)):
            Circle(F0_R)
    extrude(amount=F5_DEPTH)

    # F6 (size 0.5 and 1 in the source; OpenCascade refuses exactly that, so slightly less here)
    f6_edges = [f4.edges().sort_by_distance(p)[0] for p in [
        (-2.167614, -57.540031, 3),
        (-22.667221, -49.039837, 3),
        (-2.167221, -40.540031, 3),
        (18.332779, -49.040031, 3),
    ]]
    f6_side = f4.faces().sort_by_distance((-2.167284, -49.040056, 3))[0]
    chamfer(f6_edges, length=F6_SIZE, length2=F6_SIZE2, reference=f6_side)

    # F0 (on Top) → F9 (join)
    with BuildSketch(Plane.XY):
        with Locations((23.8327789042, -40.9150313383)):
            Rectangle(F0_W, F0_H)
        with Locations((23.8327789042, -57.1650313383)):
            Rectangle(F0_W, F0_H)
    extrude(amount=F9_DEPTH)


solid = Compound([f1.part, f4.part])
